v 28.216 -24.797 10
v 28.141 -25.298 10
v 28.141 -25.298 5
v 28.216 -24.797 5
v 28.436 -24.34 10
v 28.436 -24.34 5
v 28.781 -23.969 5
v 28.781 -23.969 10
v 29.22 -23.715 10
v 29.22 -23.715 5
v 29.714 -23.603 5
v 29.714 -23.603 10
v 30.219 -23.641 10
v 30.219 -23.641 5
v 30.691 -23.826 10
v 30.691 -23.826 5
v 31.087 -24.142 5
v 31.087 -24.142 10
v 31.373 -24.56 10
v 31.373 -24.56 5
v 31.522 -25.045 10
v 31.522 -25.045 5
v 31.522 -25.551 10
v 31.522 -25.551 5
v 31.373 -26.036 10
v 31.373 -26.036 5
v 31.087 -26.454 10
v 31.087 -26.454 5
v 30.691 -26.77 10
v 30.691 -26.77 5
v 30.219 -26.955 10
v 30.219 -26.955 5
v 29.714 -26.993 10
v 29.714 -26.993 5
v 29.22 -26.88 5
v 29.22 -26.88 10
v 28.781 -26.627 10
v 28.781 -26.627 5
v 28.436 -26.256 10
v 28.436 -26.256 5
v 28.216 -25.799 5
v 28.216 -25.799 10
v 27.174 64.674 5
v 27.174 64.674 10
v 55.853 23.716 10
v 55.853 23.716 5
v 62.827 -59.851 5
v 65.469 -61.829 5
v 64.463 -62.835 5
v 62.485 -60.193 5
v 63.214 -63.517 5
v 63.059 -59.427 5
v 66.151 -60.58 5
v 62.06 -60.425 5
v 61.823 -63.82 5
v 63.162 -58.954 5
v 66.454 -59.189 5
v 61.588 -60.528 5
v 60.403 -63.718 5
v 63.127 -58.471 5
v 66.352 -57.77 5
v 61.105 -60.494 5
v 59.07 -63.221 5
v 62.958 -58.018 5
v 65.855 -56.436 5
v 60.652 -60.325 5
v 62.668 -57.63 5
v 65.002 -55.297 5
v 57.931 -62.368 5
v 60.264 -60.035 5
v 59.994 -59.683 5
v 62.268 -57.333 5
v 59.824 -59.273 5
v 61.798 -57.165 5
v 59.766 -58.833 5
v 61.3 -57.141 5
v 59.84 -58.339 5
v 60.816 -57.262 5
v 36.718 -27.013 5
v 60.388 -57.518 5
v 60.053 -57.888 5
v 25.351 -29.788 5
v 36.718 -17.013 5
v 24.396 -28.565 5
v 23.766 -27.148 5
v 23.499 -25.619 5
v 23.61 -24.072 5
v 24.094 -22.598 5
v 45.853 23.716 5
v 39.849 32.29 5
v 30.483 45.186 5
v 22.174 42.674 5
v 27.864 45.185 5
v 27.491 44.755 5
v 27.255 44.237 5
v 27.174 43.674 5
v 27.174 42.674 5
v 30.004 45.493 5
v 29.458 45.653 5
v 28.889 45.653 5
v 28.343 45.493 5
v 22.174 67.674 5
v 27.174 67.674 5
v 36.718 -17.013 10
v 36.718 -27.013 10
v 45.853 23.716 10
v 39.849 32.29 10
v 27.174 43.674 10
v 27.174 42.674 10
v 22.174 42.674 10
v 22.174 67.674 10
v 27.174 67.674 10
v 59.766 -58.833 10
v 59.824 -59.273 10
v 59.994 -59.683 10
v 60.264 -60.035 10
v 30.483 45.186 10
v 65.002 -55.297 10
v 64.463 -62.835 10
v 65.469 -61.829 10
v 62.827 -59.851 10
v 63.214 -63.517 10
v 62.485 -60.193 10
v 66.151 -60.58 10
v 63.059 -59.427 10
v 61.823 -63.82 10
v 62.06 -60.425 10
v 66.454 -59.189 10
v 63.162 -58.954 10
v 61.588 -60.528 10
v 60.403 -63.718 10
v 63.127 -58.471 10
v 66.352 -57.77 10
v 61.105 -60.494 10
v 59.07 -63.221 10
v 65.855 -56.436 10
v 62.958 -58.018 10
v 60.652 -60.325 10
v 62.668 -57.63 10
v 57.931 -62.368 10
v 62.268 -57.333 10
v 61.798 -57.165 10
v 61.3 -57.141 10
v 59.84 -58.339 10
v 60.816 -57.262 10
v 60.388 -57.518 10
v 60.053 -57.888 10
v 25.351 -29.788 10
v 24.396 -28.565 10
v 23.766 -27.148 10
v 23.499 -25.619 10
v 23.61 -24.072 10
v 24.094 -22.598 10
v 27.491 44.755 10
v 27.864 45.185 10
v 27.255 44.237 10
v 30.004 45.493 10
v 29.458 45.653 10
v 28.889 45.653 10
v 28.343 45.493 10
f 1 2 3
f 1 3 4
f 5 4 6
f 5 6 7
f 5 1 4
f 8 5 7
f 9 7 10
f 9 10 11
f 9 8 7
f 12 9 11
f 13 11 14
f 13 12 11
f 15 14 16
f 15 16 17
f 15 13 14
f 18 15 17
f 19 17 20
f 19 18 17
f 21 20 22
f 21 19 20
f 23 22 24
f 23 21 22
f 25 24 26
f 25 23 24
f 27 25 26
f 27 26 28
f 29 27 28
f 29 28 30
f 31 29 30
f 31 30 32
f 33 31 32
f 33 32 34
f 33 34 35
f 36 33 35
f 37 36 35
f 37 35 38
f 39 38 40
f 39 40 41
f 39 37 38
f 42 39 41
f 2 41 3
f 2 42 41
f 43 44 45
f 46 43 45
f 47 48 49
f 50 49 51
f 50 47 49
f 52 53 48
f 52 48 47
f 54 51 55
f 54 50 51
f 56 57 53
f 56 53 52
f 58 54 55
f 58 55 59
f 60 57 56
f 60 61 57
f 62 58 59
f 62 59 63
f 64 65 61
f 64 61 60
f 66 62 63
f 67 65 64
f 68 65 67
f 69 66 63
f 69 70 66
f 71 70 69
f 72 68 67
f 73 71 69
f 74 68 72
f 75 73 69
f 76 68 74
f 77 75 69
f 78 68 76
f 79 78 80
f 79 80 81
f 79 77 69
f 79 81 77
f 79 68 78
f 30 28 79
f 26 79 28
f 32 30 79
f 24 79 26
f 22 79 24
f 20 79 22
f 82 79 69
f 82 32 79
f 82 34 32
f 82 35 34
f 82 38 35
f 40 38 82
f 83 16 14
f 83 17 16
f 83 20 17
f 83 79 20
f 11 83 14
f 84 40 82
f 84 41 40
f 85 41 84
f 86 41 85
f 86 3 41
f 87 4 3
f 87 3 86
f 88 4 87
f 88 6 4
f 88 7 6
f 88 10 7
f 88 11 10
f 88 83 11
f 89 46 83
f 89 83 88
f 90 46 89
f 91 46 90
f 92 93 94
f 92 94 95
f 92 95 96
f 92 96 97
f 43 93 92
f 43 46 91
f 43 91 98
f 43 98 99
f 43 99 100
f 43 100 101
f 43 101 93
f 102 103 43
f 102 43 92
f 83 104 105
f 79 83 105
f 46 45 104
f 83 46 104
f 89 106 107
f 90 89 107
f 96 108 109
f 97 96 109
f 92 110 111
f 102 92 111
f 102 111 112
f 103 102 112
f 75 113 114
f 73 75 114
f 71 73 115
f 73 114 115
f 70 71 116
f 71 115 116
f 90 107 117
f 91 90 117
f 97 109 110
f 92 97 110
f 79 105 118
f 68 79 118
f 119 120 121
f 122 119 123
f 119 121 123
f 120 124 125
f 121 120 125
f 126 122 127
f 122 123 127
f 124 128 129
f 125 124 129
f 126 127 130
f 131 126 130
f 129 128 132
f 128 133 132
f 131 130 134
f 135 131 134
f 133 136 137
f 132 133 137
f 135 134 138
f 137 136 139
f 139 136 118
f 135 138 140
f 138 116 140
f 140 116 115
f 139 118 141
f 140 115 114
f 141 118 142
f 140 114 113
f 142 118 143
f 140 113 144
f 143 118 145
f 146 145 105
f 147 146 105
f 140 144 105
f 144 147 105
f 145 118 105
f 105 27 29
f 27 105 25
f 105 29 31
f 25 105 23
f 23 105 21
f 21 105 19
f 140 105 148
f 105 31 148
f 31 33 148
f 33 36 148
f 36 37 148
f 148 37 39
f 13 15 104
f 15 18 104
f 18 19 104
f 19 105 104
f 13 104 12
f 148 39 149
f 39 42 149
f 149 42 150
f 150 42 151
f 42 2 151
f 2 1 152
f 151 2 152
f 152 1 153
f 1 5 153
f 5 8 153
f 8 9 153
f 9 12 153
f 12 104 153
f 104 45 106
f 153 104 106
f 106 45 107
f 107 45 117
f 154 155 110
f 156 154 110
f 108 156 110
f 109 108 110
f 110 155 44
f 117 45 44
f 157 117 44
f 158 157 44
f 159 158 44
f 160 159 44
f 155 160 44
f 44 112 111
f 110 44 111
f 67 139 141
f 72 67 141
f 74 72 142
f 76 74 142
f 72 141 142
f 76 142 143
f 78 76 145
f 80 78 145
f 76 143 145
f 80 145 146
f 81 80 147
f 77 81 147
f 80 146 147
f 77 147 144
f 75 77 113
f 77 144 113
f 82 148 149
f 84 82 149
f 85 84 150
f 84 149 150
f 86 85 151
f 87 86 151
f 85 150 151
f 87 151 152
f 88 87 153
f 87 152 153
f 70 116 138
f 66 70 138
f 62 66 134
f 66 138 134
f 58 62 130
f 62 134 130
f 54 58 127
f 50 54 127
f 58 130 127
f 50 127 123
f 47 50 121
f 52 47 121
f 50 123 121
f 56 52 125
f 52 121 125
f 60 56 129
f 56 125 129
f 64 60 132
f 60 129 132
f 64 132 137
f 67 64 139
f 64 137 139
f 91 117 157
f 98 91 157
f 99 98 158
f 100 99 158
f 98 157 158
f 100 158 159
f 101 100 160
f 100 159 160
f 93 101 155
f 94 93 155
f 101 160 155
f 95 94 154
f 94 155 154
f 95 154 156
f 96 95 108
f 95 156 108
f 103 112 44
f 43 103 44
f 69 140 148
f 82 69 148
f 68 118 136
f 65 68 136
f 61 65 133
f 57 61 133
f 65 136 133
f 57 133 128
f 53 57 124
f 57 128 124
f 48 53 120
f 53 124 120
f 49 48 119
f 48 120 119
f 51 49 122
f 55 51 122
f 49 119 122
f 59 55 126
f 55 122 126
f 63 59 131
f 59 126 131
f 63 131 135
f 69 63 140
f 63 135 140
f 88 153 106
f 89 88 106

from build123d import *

# Parameters (mm, degrees)
F0_R     = 1.7
F1_DEPTH = 5
F2_ANGLE = 180


with BuildPart() as f1:
    # F0 (on Top) → F1 (new body)
    with BuildSketch(Plane.XY):
        with BuildLine():
            Line((14.554017, 67.673713), (9.554017, 67.673713))
            Line((9.554017, 67.673713), (9.554017, 64.673713))
            Line((9.554017, 64.673713), (-19.124805, 23.716111))
            Line((-19.124805, 23.716111), (0.01047, -17.012764))
            Line((0.01047, -17.012764), (0.01047, -27.012764))
            Line((0.01047, -27.012764), (7.081537, -34.083832))
            Line((7.081537, -34.083832), (11.377259, -29.78811))
            ThreePointArc((11.377259, -29.78811), (13.142242, -26.391636), (12.634428, -22.597782))
            Line((12.634428, -22.597782), (-9.124805, 23.716111))
            Line((-9.124805, 23.716111), (-3.120972, 32.290473))
            Line((-3.120972, 32.290473), (6.244902, 45.185738))
            ThreePointArc((6.244902, 45.185738), (8.385212, 45.49281), (9.554017, 43.673713))
            Line((9.554017, 43.673713), (9.554017, 42.673713))
            Line((9.554017, 42.673713), (14.554017, 42.673713))
            Line((14.554017, 42.673713), (14.554017, 67.673713))
        make_face()
        with Locations((6.887131, -25.297982)):
            Circle(F0_R, mode=Mode.SUBTRACT)
        with BuildLine():
            Line((7.081537, -34.083832), (0.01047, -27.012764))
            Line((0.01047, -27.012764), (-28.273802, -55.297035))
            Line((-28.273802, -55.297035), (-25.940349, -57.630488))
            ThreePointArc((-25.940349, -57.630488), (-24.087706, -57.261974), (-23.038268, -58.832569))
            ThreePointArc((-23.038268, -58.832569), (-23.167673, -59.483131), (-23.536186, -60.034651))
            Line((-23.536186, -60.034651), (-21.202734, -62.368103))
            Line((-21.202734, -62.368103), (7.081537, -34.083832))
        make_face()
        with BuildLine():
            Line((-25.940349, -57.630488), (-28.273802, -55.297035))
            ThreePointArc((-28.273802, -55.297035), (-28.273802, -62.368103), (-21.202734, -62.368103))
            Line((-21.202734, -62.368103), (-23.536186, -60.034651))
            ThreePointArc((-23.536186, -60.034651), (-25.940349, -60.034651), (-25.940349, -57.630488))
        make_face()
    extrude(amount=F1_DEPTH)


with BuildPart() as f1_1:
    # F2: moved
    add(f1.part.rotate(Axis((14.554017, 55.173713, 5), (0, -1, 0)), F2_ANGLE))


with BuildPart() as f1_2:
    # F3: moved
    add(f1_1.part.moved(Location((7.62, 0, 0))))


solid = f1_2.part
